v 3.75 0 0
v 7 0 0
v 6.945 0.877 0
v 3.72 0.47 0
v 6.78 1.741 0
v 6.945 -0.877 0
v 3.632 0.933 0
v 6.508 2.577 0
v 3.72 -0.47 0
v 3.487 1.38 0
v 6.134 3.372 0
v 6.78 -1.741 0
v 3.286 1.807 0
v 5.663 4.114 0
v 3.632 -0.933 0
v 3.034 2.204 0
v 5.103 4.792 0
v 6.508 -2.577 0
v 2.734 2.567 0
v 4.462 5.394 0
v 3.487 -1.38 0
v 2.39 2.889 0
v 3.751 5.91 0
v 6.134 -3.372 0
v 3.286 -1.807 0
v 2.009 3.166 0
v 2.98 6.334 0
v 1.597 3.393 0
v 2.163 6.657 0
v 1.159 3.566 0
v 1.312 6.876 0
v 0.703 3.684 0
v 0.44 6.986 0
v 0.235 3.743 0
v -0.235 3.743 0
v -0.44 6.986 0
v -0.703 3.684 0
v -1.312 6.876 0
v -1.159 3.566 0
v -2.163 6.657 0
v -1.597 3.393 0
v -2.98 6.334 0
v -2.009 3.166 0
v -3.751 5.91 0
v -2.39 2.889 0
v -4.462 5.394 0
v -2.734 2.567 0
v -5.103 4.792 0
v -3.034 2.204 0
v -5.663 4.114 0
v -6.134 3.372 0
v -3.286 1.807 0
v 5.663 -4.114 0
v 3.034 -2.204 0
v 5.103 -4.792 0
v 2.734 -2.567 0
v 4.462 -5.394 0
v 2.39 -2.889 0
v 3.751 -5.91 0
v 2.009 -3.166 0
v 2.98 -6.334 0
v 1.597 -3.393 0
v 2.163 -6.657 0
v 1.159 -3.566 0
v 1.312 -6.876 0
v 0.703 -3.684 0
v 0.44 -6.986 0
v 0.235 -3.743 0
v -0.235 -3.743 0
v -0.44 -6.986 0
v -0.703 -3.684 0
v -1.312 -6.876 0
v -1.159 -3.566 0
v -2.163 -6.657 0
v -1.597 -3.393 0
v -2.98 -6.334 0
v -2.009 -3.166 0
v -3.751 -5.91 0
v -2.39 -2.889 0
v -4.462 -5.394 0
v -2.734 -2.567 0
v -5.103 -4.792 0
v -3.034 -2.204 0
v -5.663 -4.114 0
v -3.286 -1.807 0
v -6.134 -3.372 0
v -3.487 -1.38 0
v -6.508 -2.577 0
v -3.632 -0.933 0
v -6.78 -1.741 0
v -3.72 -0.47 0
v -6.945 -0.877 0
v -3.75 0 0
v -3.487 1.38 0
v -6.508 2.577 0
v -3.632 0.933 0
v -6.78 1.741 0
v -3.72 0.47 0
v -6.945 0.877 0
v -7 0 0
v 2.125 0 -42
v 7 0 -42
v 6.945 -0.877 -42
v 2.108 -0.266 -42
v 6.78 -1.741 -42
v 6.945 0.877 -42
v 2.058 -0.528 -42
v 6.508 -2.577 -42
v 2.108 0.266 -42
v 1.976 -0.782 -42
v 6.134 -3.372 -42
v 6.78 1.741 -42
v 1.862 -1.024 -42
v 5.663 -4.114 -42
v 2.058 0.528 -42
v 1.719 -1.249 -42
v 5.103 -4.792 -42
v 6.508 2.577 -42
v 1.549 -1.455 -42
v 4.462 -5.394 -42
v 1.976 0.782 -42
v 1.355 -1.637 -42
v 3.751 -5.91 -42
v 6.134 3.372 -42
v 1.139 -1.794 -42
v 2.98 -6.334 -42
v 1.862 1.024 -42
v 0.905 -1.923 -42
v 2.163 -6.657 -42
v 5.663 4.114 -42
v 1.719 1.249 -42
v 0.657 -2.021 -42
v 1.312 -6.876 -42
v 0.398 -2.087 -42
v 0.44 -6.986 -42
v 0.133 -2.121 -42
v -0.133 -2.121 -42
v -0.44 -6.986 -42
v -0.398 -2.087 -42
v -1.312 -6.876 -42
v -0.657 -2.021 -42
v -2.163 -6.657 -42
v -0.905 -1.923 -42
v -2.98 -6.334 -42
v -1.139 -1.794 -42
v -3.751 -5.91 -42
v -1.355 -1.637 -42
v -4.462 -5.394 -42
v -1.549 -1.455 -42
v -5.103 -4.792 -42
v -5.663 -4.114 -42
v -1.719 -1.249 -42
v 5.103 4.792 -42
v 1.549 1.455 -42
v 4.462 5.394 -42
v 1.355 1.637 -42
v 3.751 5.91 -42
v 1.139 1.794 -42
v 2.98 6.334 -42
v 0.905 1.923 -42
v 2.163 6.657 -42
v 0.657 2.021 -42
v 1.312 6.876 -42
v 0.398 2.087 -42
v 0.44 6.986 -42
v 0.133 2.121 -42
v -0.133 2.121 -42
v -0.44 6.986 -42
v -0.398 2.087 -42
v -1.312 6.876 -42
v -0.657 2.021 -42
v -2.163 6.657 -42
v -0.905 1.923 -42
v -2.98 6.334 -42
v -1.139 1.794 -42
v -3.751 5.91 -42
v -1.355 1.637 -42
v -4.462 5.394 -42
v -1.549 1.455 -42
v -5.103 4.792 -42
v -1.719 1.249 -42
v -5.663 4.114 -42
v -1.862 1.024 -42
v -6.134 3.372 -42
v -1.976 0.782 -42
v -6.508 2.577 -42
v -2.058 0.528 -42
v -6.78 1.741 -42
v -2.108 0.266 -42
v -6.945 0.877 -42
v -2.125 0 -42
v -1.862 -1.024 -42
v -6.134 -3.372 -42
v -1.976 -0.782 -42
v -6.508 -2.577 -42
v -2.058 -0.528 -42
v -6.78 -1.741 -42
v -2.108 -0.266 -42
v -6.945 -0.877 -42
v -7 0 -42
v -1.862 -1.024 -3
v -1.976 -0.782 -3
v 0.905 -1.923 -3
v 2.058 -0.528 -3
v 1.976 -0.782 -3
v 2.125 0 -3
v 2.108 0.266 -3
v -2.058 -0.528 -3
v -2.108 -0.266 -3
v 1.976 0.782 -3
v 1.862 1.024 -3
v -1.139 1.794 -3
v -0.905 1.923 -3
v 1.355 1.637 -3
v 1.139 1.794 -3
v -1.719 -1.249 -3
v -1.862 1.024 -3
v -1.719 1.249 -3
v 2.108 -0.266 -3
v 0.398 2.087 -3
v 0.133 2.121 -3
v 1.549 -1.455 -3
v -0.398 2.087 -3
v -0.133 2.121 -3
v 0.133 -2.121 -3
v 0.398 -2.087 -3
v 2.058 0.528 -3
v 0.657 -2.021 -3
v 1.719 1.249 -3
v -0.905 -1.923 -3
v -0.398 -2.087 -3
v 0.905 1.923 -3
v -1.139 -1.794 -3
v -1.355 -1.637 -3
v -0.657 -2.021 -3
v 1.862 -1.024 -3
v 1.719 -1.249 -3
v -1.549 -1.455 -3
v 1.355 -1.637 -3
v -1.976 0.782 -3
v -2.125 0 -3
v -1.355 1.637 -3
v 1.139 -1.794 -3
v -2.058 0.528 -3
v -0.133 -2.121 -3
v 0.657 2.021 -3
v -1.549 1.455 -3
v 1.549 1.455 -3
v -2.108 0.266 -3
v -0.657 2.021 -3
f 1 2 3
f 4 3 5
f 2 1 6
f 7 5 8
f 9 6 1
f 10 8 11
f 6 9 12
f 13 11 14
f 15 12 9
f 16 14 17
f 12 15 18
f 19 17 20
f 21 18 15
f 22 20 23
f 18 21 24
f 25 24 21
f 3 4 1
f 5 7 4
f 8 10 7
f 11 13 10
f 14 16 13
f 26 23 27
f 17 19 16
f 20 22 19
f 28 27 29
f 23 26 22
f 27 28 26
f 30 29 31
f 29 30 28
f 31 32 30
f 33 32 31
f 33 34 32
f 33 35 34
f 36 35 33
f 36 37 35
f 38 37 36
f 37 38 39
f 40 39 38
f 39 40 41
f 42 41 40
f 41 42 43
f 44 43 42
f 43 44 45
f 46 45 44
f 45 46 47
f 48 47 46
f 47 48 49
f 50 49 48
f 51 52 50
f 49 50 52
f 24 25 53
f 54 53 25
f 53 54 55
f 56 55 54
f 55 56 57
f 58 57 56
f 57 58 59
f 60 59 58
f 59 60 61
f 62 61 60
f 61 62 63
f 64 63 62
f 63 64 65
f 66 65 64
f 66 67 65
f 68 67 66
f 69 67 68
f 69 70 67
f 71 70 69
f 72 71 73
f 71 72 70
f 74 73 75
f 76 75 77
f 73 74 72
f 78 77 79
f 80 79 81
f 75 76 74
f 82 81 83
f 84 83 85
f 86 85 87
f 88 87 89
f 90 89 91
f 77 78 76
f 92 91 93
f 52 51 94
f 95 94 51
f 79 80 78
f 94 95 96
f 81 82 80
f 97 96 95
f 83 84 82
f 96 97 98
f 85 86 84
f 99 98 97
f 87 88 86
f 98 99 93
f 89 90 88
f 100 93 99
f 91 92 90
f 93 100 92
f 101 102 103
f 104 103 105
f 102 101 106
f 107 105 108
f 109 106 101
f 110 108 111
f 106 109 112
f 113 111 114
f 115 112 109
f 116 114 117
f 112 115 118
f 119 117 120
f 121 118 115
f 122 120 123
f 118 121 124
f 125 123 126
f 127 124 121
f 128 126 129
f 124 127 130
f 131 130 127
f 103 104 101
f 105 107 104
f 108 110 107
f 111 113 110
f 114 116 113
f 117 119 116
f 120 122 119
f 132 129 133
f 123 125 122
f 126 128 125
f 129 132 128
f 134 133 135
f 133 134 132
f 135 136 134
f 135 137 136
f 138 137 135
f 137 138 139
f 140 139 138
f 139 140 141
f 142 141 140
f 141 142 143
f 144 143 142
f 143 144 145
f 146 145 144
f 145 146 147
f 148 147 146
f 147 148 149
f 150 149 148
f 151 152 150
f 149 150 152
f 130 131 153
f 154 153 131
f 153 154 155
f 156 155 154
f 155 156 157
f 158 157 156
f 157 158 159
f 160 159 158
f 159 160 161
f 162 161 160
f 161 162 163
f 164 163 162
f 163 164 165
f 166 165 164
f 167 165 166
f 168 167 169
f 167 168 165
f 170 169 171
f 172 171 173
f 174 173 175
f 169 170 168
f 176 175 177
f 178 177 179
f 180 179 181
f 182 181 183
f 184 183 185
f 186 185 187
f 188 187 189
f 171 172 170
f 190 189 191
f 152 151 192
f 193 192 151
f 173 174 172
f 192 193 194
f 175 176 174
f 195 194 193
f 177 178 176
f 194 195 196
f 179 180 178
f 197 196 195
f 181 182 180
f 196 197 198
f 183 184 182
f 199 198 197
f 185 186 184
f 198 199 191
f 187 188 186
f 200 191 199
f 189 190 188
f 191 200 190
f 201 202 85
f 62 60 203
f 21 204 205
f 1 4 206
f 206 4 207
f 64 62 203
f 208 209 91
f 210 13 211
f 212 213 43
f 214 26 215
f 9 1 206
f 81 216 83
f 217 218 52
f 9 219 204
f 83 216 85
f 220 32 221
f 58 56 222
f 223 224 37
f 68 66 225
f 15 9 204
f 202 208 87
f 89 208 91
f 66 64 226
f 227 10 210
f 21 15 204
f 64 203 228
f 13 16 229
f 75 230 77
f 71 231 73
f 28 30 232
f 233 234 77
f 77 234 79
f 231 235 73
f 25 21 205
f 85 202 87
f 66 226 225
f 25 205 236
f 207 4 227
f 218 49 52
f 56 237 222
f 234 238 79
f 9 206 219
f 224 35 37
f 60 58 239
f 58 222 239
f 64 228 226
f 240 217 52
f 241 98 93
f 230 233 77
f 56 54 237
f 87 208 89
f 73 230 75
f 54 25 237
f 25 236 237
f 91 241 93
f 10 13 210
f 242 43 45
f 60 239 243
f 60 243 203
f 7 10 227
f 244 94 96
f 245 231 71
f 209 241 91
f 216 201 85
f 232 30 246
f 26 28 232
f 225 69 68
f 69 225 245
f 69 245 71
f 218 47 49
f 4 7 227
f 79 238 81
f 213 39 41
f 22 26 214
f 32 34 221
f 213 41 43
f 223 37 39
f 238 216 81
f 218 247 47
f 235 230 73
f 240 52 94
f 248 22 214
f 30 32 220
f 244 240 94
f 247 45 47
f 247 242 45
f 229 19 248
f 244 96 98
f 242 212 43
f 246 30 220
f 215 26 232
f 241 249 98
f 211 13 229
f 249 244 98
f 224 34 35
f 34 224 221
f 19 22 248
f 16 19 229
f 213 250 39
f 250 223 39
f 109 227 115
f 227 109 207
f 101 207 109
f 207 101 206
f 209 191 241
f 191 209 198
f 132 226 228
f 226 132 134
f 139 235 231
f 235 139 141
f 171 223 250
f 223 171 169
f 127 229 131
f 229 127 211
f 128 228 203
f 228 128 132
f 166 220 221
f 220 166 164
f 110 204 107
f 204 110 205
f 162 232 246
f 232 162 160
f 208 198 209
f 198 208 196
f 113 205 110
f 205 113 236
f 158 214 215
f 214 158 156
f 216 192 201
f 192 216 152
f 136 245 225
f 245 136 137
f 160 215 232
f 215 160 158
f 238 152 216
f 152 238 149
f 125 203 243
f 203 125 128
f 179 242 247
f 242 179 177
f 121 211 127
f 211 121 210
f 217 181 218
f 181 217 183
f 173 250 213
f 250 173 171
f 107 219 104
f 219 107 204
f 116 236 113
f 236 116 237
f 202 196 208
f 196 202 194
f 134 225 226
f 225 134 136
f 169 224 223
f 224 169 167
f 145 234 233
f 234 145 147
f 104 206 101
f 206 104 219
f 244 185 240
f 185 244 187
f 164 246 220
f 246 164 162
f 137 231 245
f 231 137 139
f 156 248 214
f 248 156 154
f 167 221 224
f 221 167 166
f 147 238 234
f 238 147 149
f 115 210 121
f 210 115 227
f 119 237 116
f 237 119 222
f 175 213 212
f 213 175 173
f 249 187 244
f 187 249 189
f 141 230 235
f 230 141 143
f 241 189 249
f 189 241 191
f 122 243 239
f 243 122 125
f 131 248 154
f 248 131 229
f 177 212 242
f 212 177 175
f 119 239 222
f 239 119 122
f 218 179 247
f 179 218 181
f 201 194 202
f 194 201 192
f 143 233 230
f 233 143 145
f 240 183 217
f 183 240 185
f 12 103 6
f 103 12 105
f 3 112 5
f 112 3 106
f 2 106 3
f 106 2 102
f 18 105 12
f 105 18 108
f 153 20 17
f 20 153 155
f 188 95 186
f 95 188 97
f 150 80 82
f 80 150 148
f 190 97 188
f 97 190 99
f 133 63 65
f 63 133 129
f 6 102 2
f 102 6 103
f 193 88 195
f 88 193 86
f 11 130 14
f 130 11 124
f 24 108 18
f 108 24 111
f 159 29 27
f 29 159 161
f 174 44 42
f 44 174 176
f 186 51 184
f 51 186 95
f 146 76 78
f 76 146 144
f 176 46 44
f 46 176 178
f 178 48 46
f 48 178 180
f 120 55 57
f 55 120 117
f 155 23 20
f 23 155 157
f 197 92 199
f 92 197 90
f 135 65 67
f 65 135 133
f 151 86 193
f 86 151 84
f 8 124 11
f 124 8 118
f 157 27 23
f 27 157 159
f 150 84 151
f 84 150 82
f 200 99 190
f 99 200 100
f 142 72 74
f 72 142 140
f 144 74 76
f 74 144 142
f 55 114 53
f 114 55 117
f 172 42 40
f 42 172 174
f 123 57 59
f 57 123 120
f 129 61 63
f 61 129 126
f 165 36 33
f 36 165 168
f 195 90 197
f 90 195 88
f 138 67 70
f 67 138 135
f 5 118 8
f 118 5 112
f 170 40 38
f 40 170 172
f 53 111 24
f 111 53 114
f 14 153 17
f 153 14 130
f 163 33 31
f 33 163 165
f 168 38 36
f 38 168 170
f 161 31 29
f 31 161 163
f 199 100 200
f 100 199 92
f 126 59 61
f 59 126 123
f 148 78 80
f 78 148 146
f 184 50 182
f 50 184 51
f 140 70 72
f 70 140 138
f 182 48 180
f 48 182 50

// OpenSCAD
$fn = 50;


difference() {
	union() {
		translate(v = [0, 0, -42.0000000000]) {
			cylinder(h = 42, r = 7.0000000000);
		}
		cylinder(h = 0, r = 17.0000000000);
	}
	union() {
		translate(v = [0, 0, 0]) {
			rotate(a = [0, 0, 0]) {
				difference() {
					union() {
						#translate(v = [0, 0, -42.0000000000]) {
							cylinder(h = 42, r = 2.0000000000);
						}
						#translate(v = [0, 0, -3]) {
							cylinder(h = 3, r1 = 2.1250000000, r2 = 3.7500000000);
						}
						#translate(v = [0, 0, -42.0000000000]) {
							cylinder(h = 42, r = 2.1250000000);
						}
						#translate(v = [0, 0, -42.0000000000]) {
							cylinder(h = 42, r = 2.0000000000);
						}
					}
					union();
				}
			}
		}
	}
}
